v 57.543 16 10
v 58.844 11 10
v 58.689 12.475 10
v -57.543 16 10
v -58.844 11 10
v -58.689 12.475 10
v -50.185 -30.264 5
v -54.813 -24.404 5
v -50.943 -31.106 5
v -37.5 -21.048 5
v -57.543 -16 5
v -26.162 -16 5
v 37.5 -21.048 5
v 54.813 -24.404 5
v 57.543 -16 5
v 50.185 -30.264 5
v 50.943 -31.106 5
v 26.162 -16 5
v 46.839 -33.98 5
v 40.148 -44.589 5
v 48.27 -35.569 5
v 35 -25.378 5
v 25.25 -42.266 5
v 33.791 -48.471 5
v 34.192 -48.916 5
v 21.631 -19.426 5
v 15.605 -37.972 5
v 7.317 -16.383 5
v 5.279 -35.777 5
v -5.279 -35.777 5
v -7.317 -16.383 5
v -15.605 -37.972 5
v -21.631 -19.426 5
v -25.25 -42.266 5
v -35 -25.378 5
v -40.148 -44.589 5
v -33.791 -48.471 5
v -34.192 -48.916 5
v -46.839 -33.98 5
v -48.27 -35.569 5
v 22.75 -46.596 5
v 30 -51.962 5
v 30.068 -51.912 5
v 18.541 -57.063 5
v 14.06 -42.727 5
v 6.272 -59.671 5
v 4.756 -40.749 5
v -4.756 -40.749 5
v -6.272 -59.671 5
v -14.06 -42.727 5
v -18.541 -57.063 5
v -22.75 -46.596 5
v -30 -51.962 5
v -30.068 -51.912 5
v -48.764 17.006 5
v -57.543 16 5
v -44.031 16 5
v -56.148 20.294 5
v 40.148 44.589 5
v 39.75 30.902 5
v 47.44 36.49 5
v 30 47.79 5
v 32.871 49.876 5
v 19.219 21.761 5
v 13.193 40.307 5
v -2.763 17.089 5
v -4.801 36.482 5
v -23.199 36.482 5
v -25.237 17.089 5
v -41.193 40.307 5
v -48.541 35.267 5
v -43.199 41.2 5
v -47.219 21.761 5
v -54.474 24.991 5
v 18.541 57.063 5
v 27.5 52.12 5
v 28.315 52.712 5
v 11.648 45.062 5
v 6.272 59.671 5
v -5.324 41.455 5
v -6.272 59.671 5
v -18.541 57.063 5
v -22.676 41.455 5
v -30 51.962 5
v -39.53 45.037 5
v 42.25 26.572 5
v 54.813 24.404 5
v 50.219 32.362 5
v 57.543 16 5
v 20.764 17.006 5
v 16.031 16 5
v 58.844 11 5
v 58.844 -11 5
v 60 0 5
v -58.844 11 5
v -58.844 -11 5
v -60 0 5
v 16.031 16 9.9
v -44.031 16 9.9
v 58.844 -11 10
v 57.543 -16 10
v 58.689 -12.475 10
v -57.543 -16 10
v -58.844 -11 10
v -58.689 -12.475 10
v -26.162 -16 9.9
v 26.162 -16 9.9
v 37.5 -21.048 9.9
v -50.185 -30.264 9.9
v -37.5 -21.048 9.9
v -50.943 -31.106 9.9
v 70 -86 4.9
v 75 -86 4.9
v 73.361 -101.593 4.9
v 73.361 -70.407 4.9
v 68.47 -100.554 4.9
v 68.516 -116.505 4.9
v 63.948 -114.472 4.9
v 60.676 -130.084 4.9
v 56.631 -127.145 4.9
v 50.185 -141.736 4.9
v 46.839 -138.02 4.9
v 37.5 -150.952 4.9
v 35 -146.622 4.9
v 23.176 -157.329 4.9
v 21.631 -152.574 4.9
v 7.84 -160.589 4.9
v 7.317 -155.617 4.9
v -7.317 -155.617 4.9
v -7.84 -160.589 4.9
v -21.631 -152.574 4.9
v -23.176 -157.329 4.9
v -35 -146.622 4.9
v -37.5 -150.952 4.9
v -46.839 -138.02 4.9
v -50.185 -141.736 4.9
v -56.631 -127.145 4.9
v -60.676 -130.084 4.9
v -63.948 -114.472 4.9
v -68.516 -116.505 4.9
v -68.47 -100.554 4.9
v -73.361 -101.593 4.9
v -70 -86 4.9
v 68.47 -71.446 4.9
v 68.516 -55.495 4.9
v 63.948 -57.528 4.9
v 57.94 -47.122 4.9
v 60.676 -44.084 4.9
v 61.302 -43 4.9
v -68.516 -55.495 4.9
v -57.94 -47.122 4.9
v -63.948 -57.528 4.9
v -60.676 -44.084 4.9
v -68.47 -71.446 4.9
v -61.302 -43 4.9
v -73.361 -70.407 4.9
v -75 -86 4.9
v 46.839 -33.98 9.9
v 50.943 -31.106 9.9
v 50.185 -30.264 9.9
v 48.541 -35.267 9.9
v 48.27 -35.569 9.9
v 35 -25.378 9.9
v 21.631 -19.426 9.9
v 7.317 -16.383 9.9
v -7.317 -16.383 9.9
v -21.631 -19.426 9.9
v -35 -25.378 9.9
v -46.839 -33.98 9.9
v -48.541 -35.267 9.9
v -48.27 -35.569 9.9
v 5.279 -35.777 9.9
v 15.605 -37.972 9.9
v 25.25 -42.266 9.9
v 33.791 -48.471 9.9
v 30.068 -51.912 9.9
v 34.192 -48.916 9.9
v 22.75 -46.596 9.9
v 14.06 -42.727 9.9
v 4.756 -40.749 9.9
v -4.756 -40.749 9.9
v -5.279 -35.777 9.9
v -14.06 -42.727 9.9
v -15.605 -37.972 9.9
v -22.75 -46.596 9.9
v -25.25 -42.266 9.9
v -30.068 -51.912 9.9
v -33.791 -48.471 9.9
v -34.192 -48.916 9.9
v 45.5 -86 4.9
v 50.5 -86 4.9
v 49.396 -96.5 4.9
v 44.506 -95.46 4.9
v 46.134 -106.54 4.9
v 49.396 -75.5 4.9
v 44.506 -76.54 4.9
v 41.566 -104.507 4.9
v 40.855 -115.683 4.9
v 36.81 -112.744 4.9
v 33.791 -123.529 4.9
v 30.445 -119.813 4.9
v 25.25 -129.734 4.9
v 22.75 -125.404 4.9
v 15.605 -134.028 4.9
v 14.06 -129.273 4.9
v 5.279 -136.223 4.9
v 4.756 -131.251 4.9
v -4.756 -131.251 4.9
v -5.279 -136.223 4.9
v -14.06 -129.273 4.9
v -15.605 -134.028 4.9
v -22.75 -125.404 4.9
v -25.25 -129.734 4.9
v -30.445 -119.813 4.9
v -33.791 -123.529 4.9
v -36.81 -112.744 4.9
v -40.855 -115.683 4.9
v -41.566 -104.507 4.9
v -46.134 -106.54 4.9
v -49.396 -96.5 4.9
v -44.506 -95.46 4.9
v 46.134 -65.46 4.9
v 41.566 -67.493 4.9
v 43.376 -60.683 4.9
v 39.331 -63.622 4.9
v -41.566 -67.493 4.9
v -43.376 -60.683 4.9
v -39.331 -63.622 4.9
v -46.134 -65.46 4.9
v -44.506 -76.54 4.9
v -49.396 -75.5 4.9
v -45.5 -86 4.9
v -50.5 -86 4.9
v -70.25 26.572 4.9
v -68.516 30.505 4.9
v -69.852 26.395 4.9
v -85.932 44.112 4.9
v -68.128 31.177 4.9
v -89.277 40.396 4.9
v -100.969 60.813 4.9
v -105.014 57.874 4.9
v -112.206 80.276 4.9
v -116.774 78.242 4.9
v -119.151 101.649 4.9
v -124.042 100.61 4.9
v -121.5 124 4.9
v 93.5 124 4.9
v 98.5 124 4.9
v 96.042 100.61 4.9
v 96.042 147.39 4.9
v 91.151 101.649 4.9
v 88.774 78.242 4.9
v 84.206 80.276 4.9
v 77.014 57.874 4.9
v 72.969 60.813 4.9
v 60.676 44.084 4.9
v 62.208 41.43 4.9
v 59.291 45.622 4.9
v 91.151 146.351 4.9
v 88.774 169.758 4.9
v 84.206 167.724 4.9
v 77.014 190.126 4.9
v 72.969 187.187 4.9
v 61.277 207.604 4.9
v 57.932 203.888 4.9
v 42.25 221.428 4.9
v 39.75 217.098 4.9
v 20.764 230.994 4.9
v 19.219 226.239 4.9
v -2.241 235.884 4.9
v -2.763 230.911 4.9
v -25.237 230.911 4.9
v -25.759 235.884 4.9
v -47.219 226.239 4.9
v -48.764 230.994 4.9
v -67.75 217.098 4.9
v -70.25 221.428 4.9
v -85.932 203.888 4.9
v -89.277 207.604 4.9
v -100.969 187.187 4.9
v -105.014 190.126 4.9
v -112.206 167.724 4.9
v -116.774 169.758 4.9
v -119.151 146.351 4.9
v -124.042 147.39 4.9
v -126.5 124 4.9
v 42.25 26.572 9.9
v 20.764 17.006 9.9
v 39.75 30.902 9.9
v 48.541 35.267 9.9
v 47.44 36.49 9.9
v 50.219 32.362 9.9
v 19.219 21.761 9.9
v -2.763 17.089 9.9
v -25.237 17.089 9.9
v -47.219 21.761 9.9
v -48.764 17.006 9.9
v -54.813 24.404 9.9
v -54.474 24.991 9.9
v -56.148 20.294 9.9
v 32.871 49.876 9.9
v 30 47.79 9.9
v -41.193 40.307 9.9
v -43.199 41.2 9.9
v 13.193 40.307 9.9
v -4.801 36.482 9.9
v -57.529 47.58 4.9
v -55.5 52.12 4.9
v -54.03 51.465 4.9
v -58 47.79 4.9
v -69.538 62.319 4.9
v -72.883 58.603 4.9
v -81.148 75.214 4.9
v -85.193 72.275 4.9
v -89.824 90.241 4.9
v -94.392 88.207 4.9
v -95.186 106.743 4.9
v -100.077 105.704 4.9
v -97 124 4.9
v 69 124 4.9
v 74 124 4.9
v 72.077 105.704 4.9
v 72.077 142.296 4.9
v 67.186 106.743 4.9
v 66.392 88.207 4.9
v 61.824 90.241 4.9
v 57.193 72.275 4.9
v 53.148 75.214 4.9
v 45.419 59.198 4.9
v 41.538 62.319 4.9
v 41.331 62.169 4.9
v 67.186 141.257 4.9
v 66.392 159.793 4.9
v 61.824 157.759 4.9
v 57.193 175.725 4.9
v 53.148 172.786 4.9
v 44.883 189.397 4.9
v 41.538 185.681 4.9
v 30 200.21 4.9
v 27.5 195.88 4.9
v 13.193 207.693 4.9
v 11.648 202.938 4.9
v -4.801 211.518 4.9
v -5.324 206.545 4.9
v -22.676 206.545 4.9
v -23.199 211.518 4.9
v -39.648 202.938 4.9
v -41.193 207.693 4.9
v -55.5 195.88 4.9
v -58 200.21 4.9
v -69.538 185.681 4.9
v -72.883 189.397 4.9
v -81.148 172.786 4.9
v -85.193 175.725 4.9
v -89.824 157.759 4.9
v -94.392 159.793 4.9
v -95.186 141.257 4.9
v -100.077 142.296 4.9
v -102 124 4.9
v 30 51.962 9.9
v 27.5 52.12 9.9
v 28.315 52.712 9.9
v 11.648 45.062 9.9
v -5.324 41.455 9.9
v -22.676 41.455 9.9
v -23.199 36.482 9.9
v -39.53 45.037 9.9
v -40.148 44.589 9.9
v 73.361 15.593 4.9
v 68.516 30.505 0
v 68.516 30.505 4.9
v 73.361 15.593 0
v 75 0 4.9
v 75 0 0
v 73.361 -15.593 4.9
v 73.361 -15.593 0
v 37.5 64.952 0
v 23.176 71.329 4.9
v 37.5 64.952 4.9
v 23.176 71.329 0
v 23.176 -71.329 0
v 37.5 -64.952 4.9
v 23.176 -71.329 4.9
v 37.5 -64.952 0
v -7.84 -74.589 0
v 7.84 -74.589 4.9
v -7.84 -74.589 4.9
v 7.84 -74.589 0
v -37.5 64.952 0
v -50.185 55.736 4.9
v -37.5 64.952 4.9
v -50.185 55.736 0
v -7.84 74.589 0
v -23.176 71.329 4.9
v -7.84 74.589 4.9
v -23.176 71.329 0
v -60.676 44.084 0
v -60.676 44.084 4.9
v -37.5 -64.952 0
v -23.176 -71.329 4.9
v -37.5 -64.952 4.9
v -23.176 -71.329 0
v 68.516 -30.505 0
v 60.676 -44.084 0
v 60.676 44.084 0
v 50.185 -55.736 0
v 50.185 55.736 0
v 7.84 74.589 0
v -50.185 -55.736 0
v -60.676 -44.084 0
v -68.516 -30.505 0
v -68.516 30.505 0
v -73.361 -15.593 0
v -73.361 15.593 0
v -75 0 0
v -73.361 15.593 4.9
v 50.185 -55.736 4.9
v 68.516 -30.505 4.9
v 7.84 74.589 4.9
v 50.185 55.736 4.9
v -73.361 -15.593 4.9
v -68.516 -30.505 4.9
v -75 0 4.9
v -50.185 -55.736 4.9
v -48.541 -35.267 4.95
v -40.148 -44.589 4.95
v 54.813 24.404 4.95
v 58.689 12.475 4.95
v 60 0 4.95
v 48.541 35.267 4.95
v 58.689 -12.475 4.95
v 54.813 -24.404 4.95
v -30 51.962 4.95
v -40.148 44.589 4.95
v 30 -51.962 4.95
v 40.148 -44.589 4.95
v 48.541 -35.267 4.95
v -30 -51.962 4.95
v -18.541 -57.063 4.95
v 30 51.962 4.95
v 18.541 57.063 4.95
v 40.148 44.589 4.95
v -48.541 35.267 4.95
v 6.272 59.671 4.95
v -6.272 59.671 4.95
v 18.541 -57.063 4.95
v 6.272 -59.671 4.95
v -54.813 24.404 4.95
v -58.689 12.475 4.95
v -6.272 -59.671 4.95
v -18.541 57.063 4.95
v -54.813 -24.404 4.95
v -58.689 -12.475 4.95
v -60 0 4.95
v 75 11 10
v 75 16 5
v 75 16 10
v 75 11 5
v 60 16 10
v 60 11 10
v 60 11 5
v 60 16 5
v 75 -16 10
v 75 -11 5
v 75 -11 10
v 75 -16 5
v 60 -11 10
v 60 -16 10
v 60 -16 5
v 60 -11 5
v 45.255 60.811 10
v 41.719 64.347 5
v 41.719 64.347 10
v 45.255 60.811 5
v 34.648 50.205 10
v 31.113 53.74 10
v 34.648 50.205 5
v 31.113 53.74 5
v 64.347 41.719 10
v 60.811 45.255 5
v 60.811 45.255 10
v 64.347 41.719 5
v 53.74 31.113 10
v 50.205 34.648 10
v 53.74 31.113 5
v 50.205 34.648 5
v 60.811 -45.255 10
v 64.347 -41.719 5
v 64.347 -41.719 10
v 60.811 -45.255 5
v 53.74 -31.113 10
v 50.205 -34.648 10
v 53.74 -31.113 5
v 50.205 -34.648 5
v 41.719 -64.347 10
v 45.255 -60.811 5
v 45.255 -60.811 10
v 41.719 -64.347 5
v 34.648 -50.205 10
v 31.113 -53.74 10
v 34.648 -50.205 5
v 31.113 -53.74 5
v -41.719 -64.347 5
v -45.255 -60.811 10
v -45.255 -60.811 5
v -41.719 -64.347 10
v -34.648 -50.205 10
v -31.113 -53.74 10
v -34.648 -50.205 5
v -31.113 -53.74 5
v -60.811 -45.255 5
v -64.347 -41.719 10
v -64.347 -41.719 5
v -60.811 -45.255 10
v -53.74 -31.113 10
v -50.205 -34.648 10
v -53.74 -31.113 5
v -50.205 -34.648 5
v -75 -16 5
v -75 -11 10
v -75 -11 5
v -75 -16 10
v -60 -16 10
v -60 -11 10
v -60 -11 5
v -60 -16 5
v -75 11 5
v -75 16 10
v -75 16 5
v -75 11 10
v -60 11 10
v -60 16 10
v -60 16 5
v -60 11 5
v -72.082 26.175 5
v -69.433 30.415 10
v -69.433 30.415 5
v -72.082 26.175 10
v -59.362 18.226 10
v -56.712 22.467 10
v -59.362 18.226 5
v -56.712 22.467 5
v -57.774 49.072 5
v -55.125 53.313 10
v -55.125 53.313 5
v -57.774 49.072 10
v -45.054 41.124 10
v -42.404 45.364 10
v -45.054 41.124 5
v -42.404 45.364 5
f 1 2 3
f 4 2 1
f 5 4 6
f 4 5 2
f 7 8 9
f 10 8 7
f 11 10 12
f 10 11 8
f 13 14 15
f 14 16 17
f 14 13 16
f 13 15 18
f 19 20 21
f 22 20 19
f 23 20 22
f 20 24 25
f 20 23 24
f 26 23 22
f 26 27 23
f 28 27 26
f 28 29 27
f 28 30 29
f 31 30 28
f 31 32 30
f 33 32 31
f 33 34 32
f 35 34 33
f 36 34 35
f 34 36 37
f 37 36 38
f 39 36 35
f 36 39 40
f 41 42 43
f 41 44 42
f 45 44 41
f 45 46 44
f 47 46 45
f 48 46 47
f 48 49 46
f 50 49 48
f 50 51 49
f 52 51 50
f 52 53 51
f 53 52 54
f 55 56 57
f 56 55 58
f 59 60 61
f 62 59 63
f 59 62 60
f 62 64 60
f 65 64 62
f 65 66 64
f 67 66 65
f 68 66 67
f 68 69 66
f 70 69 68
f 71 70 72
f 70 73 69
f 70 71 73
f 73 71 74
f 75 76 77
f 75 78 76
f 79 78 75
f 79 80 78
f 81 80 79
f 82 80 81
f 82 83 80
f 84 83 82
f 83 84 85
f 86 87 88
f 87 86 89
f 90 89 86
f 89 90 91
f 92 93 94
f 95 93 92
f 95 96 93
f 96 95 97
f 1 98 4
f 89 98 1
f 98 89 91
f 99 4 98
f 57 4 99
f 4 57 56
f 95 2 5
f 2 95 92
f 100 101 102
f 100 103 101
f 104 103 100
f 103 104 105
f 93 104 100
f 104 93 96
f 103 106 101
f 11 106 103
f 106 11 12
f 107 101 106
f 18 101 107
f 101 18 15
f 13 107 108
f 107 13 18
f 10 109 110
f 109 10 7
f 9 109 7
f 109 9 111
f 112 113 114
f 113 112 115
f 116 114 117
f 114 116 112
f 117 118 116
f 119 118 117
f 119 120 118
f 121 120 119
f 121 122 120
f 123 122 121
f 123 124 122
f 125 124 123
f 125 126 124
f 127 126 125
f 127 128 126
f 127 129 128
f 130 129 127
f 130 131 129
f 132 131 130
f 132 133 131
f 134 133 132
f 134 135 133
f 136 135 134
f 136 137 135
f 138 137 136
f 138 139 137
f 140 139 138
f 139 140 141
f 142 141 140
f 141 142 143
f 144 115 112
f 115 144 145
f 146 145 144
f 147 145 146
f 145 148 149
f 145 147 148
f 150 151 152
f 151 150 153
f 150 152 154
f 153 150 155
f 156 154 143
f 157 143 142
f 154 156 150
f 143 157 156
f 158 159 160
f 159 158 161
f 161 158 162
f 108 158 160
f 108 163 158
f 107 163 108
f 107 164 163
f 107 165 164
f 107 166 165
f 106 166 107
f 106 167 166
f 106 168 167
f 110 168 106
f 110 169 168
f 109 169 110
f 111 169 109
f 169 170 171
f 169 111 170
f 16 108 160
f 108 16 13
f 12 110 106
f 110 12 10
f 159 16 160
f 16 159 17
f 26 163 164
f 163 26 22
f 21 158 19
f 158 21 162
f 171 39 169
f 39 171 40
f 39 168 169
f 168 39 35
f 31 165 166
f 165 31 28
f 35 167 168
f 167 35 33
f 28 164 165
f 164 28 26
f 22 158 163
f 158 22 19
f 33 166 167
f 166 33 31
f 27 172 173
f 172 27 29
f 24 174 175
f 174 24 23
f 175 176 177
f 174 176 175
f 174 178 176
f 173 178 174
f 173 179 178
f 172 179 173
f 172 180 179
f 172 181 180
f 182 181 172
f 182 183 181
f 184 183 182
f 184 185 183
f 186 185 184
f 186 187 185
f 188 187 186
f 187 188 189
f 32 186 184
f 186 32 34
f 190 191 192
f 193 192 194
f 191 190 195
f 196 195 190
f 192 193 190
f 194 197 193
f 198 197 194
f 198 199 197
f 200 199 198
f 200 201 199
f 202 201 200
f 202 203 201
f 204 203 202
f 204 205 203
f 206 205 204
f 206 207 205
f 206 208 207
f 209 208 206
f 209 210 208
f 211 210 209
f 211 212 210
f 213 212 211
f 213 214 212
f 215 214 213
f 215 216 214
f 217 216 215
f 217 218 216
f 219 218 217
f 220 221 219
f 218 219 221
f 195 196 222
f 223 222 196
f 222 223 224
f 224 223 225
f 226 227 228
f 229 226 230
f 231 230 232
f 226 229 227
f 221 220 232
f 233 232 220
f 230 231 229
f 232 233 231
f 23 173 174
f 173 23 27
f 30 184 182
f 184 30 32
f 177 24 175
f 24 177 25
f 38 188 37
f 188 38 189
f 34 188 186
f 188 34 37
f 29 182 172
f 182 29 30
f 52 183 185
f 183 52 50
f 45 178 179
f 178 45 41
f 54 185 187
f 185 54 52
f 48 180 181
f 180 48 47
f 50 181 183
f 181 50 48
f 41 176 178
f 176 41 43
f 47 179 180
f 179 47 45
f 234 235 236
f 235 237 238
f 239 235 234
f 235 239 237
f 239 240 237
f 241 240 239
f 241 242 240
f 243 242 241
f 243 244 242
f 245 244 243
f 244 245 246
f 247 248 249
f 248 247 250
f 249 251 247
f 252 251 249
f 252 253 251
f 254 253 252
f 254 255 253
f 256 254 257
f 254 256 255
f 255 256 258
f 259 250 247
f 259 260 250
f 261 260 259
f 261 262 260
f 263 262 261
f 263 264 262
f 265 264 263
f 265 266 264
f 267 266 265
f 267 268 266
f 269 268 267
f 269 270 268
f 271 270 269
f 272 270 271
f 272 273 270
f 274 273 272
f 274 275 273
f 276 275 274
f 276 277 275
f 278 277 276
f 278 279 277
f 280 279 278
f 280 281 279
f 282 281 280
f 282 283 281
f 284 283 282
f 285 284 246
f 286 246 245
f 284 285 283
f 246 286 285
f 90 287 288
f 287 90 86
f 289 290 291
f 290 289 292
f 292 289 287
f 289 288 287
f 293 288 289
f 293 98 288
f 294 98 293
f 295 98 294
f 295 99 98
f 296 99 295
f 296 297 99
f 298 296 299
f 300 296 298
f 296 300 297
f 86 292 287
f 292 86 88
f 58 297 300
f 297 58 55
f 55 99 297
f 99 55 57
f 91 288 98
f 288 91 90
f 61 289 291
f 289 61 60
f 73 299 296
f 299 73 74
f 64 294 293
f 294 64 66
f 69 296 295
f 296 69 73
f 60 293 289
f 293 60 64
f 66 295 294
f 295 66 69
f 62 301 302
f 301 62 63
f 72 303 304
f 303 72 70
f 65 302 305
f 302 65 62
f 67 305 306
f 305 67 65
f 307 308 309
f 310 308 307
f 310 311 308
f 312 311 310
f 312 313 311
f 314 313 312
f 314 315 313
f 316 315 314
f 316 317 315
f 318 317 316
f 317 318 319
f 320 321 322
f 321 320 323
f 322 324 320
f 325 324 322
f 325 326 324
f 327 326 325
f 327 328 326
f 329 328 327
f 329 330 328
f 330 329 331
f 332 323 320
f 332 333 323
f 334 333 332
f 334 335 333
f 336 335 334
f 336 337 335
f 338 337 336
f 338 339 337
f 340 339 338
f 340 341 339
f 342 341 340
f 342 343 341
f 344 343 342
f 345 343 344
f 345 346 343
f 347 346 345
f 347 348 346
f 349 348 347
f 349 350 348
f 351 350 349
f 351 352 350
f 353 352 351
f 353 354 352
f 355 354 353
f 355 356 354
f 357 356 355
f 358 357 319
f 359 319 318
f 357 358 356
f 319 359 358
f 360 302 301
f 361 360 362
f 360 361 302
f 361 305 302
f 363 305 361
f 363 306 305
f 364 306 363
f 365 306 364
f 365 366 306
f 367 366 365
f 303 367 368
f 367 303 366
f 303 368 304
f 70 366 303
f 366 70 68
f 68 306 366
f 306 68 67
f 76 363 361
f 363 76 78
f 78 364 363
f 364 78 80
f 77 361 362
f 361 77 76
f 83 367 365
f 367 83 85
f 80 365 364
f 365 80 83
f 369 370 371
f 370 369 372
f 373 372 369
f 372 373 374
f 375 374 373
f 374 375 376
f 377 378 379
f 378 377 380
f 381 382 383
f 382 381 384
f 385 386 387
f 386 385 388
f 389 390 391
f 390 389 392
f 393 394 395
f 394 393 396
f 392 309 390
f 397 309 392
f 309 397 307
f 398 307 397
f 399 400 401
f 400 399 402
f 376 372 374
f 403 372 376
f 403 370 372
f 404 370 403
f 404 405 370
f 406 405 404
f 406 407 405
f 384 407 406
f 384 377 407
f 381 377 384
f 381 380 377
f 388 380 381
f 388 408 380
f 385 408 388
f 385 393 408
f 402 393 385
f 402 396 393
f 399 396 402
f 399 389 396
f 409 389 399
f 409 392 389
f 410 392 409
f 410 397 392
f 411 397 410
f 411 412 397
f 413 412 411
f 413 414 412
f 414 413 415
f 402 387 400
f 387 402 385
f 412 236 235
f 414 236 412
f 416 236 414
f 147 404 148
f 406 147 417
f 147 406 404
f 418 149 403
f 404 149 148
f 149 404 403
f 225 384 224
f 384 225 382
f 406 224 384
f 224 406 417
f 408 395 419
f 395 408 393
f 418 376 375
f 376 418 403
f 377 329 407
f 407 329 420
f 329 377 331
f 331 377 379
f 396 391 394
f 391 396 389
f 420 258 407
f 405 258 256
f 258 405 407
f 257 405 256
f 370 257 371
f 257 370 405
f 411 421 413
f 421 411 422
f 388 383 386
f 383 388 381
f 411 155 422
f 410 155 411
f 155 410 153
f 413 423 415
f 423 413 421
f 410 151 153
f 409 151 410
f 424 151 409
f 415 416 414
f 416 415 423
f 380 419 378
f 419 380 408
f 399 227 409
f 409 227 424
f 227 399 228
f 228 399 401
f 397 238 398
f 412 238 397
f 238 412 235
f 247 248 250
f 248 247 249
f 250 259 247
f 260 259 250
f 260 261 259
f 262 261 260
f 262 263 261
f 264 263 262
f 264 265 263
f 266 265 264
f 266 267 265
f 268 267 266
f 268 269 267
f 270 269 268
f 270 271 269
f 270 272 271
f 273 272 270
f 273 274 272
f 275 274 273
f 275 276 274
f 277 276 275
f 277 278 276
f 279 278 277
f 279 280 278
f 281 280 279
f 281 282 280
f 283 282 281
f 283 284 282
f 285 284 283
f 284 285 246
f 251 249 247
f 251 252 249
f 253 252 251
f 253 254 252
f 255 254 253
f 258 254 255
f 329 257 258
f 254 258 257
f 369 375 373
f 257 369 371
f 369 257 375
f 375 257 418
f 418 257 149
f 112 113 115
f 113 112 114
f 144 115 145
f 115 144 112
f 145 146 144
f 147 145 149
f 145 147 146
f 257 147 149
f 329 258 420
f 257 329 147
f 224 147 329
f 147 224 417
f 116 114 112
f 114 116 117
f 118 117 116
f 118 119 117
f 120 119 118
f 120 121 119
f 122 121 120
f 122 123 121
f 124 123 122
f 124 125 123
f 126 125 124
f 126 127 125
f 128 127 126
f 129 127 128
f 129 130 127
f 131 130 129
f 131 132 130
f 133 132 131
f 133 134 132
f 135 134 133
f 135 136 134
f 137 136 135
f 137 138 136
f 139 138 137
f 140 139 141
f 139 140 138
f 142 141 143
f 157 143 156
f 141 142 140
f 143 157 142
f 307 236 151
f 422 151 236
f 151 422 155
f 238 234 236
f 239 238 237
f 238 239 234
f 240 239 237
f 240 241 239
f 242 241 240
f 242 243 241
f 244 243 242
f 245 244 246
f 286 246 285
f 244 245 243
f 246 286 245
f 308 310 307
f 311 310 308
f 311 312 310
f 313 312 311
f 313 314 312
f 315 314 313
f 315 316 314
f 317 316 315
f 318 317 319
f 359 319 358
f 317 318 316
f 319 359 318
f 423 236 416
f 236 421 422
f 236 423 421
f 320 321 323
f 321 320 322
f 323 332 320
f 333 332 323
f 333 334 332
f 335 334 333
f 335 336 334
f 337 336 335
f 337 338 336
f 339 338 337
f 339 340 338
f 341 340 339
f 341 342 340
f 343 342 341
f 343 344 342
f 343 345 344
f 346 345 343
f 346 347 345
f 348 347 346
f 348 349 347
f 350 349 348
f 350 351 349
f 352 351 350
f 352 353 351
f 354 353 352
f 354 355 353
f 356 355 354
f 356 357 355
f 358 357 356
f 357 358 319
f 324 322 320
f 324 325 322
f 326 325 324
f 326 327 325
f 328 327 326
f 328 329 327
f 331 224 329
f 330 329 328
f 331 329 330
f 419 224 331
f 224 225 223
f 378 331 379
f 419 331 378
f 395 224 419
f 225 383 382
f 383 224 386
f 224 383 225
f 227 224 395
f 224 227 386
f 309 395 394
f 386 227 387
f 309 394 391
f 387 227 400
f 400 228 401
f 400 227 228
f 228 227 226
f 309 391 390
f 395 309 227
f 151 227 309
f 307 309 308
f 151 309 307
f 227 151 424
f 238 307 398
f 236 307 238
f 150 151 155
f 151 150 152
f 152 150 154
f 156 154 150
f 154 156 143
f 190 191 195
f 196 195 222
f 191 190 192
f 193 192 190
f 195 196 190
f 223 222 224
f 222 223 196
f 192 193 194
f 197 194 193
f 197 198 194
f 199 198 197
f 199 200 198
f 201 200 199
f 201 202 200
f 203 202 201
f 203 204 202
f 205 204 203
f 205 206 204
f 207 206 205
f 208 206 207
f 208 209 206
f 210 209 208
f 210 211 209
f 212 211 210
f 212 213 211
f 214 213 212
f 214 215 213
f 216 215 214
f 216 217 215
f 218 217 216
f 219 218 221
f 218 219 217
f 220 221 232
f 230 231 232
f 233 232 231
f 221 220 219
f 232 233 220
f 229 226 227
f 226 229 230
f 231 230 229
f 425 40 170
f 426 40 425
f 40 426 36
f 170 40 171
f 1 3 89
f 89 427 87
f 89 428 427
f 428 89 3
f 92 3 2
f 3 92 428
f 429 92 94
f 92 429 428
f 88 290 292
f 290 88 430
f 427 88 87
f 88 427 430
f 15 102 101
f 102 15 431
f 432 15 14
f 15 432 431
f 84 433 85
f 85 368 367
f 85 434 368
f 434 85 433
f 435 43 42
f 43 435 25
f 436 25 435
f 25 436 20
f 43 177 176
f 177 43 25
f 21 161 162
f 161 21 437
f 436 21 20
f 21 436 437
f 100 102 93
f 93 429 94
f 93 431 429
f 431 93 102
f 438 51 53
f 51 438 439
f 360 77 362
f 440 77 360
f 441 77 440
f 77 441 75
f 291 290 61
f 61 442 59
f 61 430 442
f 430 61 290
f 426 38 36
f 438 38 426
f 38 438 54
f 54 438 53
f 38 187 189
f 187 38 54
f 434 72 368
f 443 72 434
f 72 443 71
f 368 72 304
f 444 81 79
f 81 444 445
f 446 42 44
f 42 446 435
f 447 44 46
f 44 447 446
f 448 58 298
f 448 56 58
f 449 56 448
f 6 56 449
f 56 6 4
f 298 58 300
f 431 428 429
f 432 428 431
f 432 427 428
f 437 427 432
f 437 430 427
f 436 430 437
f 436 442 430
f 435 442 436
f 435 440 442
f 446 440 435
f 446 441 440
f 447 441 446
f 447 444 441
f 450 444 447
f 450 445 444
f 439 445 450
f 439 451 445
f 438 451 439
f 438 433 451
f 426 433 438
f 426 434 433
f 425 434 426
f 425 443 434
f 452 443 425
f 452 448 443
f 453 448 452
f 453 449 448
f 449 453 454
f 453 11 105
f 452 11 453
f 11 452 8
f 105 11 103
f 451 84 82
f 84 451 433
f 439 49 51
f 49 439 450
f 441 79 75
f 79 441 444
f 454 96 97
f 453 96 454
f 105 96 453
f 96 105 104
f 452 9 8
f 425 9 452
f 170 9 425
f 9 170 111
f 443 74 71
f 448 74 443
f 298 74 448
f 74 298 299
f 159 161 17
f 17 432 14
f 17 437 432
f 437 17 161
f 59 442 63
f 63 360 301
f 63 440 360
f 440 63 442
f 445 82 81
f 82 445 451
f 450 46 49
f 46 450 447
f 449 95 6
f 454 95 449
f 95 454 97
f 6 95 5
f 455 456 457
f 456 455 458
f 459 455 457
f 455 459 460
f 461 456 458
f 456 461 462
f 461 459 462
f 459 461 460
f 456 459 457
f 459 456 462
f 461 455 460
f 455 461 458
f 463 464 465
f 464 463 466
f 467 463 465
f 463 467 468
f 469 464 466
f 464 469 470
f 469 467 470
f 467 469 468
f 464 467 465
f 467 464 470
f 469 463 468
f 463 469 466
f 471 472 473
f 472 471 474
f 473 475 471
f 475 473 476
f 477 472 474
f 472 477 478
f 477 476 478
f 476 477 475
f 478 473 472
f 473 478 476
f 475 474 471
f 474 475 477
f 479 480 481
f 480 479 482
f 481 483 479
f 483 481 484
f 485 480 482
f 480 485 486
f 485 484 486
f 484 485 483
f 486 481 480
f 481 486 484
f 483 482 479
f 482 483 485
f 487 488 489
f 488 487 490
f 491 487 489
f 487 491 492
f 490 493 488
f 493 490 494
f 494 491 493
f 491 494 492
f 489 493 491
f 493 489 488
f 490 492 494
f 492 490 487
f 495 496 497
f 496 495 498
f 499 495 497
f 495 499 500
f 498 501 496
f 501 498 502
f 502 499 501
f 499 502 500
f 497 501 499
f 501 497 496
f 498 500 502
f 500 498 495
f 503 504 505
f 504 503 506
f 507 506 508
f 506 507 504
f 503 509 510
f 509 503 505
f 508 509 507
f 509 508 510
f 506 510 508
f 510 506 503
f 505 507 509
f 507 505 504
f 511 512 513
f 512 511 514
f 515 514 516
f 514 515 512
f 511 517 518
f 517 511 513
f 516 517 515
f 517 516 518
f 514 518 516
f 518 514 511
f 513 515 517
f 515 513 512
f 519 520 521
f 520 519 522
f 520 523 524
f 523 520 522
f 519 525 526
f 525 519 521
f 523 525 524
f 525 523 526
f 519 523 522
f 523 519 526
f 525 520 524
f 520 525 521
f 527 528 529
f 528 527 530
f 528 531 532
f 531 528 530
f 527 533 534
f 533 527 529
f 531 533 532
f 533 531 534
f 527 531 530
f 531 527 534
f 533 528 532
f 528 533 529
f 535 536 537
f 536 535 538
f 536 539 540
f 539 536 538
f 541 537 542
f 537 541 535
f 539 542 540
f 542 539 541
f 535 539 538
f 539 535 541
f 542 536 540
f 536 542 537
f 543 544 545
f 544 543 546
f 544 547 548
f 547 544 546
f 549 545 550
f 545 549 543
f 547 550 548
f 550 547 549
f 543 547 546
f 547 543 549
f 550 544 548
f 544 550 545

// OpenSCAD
//turntable 
diameter=150;
height=5;
bufferWidth=5;
bufferHeight=5;
trackSpacing=22;
entryTrackLength=30;

module perimeter() {
    difference() {
       
        color("blue")  cylinder(d=500,h=height+0.2,center=true);
           color("green") cylinder(d=diameter-entryTrackLength,h=height+0.1,center=true);
    }
  

}




module straightTrack(length) {
      translate([-diameter/2,trackSpacing/2,0]) cube([length,bufferWidth,bufferHeight],center=false);
            translate([-diameter/2,-trackSpacing/2-bufferWidth,0]) cube([length,bufferWidth,bufferHeight],center=false);
}

module entryTrack() {
    color("red") translate([diameter-entryTrackLength/2,0,height]) straightTrack(entryTrackLength/2);
    
}

module curvedTrack(diameter) {
    union() {
        difference() {
        cylinder(d=diameter, h=height,center=true) ;
        cylinder(d=diameter-bufferWidth*2, h=height+0.1, center=true) ;
    }
          difference() {
        cylinder(d=diameter-trackSpacing*2-bufferWidth, h=height,center=true) ;
        cylinder(d=diameter-trackSpacing*2-bufferWidth*3, h=height+0.1, center=true) ;
    }
}
}



module base() {
    
       difference() {
           union() {
           cylinder(d=diameter,h=height);
      color("black") translate([0,0,height]) straightTrack(diameter);
    color("black") translate([0,-diameter/2-trackSpacing/2,height*3/2-0.1]) curvedTrack(diameter);
          color("green") translate([-14,+diameter/2+trackSpacing/2+38,height*3/2-0.1]) curvedTrack(diameter*1.5);       
       }
       
       {
      translate([0,0,height*3/2]) perimeter();
       }
   }
}

base();
entryTrack(); 
rotate([0,0,45]) entryTrack();
rotate([0,0,-45]) entryTrack();
rotate([0,0,-135]) entryTrack();
rotate([0,0,-180]) entryTrack();
rotate([0,0,-212]) entryTrack();
*perimeter();
